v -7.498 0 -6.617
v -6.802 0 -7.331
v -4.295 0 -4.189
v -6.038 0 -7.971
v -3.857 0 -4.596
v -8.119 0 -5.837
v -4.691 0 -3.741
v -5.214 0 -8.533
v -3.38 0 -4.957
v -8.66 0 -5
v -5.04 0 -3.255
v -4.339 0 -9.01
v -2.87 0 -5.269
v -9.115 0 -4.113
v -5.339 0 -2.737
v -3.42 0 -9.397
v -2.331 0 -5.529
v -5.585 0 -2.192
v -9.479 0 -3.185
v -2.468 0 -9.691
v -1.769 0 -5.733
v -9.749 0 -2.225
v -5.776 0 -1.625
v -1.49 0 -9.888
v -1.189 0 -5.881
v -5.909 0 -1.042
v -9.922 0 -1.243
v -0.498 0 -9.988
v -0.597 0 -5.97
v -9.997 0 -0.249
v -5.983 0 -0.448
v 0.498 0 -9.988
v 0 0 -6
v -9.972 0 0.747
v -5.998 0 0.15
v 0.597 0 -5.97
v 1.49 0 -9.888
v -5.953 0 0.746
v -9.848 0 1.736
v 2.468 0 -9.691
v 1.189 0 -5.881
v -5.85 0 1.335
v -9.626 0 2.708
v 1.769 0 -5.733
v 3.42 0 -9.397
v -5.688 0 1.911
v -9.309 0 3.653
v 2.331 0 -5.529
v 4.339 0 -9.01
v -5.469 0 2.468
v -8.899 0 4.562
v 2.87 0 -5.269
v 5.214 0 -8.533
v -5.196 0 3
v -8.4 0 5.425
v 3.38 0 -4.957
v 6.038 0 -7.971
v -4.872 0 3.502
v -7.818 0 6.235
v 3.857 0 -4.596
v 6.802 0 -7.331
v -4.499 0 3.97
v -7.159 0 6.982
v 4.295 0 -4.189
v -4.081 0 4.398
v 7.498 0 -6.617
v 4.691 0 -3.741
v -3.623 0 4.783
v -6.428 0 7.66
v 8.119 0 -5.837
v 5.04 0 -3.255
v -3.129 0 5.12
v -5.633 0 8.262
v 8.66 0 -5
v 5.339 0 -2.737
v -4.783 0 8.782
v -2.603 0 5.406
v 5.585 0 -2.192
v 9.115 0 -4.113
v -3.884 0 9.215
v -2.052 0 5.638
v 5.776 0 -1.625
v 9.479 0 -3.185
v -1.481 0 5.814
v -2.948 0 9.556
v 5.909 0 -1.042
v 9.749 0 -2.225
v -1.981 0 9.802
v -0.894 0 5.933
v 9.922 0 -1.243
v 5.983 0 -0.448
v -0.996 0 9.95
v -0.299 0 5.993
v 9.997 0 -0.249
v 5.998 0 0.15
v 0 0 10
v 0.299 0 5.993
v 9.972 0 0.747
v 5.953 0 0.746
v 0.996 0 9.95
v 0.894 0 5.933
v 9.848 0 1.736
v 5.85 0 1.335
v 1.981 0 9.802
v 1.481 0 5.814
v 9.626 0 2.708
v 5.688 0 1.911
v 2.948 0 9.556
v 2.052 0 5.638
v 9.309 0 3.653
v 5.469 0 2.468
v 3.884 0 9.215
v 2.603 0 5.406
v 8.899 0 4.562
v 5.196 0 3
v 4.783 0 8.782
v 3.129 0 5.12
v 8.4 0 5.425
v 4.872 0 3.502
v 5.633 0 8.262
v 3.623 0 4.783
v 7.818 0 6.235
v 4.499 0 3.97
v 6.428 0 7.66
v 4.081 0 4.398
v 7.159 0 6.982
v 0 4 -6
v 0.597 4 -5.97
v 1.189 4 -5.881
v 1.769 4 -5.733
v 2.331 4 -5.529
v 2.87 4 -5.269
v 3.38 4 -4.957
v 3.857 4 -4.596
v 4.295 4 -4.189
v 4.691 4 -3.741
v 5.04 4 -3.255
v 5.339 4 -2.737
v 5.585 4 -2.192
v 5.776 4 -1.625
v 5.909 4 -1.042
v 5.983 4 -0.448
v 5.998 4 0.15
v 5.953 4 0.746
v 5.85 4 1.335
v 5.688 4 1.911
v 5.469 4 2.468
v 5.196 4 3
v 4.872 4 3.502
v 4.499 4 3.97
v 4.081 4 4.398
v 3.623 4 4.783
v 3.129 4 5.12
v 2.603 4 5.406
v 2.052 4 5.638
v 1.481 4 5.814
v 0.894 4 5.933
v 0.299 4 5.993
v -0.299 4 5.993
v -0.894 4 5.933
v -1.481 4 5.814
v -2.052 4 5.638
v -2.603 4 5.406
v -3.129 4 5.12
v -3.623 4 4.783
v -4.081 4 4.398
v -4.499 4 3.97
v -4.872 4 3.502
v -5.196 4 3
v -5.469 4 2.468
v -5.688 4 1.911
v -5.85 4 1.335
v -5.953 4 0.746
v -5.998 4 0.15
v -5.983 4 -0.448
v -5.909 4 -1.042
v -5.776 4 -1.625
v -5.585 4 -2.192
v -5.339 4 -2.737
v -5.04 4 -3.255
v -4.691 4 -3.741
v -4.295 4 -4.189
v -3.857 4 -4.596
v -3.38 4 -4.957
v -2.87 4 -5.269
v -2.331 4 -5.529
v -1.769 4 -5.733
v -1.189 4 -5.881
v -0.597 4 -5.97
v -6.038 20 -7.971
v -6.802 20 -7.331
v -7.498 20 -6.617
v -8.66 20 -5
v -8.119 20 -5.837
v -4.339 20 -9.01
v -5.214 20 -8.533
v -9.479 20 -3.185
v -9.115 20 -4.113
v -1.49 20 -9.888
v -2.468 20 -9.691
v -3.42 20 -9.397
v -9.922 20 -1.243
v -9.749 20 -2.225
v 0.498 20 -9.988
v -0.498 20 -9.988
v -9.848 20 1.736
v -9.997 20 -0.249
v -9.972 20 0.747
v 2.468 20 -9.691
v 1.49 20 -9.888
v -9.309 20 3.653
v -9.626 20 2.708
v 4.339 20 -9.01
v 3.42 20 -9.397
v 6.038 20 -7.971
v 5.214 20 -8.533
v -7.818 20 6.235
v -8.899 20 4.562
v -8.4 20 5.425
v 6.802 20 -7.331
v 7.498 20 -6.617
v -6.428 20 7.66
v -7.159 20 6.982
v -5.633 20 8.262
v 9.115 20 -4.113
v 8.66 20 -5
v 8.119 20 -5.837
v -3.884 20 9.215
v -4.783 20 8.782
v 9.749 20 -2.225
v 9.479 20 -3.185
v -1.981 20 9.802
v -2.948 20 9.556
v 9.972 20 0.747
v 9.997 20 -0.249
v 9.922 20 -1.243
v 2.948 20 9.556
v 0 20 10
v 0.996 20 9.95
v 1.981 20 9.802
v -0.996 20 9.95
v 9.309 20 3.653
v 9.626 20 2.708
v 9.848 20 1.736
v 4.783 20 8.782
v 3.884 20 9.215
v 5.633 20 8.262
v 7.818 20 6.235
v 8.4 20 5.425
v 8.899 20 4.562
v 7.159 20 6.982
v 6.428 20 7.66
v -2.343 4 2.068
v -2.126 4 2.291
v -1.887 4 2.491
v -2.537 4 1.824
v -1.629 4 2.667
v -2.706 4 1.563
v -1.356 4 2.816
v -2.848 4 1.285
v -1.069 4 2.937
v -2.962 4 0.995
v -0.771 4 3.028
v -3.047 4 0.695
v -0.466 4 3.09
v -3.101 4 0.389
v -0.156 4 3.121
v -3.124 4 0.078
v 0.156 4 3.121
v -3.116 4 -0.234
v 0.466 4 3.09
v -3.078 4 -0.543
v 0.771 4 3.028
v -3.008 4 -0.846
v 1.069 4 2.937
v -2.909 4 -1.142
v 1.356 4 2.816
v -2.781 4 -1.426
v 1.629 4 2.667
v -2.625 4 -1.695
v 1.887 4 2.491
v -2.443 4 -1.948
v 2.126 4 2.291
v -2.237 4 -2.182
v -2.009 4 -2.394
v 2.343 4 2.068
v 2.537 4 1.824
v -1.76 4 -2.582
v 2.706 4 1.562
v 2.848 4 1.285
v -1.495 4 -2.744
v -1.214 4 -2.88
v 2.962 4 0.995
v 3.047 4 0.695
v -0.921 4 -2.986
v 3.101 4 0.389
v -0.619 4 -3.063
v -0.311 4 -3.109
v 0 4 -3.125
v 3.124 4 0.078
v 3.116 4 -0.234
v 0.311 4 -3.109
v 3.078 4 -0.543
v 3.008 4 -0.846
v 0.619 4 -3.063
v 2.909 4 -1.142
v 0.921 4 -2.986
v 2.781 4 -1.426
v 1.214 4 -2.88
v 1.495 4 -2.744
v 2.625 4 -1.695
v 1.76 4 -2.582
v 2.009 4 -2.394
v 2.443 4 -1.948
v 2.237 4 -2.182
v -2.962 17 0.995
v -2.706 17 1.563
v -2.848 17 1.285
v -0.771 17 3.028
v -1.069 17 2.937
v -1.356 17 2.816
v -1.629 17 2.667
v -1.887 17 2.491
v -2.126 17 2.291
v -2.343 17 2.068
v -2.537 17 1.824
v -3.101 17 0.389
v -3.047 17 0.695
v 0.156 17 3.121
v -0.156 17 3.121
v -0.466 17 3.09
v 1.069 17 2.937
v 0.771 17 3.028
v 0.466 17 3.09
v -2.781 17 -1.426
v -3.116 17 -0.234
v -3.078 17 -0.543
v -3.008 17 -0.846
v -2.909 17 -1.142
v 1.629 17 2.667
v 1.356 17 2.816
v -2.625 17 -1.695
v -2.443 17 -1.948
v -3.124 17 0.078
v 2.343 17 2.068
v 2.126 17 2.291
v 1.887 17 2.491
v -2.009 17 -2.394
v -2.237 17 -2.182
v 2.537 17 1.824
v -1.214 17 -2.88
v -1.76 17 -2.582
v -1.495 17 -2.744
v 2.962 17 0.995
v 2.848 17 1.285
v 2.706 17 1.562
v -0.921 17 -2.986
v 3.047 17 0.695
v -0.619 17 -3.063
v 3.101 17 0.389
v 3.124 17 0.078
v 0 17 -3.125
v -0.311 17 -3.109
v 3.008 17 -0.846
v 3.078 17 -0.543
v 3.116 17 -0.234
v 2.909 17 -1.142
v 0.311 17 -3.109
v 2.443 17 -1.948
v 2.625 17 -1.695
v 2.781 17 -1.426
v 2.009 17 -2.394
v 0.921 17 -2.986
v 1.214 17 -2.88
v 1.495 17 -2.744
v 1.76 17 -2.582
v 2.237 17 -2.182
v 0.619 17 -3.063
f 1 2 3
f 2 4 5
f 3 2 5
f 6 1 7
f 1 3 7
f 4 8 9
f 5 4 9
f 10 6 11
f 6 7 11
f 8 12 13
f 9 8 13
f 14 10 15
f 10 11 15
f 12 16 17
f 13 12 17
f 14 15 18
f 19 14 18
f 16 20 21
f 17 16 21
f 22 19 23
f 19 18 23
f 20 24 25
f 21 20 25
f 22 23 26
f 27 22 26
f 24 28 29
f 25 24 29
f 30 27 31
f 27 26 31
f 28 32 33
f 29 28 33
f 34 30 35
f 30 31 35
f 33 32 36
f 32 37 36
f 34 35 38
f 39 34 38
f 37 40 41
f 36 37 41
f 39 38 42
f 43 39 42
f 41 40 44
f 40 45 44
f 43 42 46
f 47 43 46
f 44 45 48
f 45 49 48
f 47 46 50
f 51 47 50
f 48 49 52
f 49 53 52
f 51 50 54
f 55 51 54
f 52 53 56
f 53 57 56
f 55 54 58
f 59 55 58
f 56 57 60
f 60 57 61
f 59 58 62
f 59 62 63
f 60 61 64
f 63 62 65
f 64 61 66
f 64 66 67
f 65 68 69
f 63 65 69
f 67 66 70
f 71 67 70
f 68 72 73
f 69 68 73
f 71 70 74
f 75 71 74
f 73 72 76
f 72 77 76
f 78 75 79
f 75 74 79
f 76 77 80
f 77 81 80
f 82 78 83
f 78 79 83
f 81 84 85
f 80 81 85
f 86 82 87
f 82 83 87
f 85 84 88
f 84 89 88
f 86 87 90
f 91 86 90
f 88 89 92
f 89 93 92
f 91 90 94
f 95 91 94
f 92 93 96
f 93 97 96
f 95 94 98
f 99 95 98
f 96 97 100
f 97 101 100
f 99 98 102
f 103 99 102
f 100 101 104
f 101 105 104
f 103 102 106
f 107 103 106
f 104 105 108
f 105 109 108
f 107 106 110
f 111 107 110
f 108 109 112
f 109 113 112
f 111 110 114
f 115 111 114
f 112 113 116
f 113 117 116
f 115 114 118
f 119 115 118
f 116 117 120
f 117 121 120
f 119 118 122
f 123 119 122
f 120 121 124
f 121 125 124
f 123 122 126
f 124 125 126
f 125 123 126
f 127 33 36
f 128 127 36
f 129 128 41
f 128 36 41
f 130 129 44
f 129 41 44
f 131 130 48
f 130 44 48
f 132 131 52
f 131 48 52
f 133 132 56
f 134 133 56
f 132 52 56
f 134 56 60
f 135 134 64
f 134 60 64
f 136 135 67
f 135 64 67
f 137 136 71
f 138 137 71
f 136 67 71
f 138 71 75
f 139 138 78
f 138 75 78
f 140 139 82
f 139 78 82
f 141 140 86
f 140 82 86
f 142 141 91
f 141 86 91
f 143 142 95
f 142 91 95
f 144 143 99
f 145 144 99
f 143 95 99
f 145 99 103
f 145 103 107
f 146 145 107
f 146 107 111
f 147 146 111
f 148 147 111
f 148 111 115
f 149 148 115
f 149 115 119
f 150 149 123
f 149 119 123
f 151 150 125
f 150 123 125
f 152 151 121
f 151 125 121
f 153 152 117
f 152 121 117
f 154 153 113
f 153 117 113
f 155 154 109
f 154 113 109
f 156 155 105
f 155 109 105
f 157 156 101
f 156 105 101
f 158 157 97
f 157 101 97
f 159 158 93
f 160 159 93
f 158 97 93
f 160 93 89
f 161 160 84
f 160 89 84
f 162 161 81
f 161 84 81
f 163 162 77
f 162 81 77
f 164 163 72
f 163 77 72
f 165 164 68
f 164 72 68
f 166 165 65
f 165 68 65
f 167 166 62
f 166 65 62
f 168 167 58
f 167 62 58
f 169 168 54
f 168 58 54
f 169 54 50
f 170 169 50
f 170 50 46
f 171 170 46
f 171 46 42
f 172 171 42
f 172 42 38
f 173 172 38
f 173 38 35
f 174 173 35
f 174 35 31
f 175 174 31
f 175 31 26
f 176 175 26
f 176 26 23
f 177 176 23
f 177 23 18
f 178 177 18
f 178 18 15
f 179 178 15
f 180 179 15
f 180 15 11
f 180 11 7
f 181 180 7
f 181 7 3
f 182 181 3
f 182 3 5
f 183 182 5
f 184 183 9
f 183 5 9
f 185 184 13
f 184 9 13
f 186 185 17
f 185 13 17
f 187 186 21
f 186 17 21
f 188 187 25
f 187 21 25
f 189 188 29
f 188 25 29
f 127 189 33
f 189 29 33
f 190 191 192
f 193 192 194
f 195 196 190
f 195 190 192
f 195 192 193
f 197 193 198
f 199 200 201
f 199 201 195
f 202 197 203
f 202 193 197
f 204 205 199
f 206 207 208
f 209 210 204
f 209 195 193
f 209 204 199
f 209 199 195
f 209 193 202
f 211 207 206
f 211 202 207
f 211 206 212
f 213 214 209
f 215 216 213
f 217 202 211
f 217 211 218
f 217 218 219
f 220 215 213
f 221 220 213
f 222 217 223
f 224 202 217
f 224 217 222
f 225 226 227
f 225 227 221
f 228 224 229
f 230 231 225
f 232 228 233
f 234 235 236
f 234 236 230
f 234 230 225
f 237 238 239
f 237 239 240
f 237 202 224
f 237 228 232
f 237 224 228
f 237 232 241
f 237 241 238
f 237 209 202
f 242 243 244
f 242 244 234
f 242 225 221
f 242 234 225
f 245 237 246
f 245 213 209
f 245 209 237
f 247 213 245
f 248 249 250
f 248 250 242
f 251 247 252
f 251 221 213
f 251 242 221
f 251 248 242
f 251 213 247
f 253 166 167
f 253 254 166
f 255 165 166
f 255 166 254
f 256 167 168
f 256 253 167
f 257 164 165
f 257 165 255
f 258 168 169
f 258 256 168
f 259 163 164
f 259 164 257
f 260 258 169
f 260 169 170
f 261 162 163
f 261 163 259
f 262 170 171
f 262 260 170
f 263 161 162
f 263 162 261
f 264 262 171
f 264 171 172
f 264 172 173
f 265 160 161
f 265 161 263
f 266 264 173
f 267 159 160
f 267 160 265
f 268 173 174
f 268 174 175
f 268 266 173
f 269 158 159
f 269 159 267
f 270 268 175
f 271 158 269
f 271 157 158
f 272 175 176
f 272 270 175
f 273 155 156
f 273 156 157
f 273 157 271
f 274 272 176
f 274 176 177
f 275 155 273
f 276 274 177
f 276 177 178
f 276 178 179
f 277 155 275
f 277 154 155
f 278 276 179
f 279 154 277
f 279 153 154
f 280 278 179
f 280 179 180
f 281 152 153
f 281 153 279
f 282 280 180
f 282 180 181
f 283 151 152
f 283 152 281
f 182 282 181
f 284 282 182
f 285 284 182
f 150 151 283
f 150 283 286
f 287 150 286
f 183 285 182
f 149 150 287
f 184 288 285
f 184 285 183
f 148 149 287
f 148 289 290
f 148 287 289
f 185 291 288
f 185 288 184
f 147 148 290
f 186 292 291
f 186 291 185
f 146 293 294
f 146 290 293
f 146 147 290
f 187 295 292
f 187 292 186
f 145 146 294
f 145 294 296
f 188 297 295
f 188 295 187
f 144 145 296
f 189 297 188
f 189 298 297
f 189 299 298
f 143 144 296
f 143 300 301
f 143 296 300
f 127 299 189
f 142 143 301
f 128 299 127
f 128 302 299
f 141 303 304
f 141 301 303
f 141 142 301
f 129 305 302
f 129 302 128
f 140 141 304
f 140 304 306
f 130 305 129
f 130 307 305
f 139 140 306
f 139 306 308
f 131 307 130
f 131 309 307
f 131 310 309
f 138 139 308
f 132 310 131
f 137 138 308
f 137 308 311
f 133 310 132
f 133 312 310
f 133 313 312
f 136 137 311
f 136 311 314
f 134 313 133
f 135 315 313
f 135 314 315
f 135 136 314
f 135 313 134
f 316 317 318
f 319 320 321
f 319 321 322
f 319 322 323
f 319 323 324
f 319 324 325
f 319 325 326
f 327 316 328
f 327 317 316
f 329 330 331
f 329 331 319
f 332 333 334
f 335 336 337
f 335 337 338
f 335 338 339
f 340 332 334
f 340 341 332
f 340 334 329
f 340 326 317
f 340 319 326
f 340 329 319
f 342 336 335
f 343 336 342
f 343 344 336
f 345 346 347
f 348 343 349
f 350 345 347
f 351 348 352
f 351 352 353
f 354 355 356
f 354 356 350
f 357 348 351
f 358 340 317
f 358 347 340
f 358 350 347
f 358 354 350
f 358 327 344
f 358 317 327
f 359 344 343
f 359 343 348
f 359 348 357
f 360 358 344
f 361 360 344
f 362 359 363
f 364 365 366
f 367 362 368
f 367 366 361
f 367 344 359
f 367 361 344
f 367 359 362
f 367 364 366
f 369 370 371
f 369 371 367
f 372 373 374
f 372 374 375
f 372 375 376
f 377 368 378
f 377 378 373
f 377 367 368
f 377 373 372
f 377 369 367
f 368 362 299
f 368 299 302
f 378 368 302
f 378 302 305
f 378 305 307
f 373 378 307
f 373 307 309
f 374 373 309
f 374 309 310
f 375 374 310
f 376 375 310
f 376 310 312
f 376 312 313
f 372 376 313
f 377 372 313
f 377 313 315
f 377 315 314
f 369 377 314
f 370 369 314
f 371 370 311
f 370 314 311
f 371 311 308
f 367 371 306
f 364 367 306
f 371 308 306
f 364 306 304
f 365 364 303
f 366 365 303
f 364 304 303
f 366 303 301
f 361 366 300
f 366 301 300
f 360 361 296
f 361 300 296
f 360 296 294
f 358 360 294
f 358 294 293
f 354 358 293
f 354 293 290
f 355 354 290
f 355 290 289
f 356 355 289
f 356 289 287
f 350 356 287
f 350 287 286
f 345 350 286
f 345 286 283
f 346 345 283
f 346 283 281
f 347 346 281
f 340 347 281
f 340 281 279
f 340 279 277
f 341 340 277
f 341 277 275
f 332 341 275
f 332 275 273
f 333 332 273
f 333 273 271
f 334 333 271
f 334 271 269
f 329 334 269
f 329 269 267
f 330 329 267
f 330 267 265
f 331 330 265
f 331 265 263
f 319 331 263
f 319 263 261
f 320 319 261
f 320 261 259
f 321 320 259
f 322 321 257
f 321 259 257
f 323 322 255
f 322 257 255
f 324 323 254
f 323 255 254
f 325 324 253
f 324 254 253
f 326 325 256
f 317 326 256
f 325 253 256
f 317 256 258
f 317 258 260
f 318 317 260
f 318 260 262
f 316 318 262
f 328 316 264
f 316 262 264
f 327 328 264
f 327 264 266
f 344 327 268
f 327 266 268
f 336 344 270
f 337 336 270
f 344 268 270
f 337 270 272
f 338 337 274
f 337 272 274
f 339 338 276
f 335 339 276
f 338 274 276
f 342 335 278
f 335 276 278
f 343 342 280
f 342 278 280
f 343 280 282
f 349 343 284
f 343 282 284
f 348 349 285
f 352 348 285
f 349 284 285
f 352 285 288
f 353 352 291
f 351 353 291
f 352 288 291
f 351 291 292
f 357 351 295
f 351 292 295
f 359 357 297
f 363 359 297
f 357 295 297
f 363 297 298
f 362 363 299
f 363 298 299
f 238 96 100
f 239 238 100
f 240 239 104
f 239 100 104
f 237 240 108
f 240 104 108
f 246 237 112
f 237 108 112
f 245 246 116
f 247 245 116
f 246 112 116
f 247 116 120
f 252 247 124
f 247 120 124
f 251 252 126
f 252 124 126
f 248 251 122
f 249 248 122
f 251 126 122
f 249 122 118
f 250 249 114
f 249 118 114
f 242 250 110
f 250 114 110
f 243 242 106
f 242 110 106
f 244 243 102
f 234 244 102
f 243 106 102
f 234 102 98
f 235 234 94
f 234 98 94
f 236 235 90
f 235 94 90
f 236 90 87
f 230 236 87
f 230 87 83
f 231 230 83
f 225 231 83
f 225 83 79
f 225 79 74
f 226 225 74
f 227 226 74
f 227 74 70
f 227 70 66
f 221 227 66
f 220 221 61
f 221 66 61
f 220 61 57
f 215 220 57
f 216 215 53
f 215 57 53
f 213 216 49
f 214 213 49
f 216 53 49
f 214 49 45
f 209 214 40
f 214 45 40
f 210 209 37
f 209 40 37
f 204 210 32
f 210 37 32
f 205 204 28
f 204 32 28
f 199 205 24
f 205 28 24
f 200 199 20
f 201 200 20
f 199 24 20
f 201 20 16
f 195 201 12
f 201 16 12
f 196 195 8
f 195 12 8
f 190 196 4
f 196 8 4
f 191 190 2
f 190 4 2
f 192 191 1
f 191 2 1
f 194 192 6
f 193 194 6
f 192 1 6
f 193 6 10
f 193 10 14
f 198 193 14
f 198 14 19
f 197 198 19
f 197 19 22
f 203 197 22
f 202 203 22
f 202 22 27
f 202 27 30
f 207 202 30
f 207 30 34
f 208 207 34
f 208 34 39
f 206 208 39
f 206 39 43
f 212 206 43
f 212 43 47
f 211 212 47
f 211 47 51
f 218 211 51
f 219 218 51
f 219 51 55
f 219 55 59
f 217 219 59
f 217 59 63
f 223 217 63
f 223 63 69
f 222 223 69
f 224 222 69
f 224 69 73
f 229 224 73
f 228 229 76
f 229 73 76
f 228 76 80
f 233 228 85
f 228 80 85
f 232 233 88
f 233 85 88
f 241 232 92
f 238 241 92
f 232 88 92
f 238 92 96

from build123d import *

# Parameters (mm, degrees)
SKETCH1_R           = 10
BOSS_EXTRUDE1_DEPTH = 20
SKETCH2_R           = 3.125
CUT_EXTRUDE1_DEPTH  = 17
SKETCH3_R           = 6
CUT_EXTRUDE2_DEPTH  = 4


with BuildPart() as part:
    # Sketch1 → Boss-Extrude1 (new body)
    with BuildSketch(Plane(origin=(0, 0, 0), x_dir=(1, 0, 0), z_dir=(0, 1, 0))):
        with Locations(Location((0, 0, 0), (0, 0, 270))):  # turned: the seam where the file's is
            Circle(SKETCH1_R)
    extrude(amount=BOSS_EXTRUDE1_DEPTH)

    # Sketch2 → Cut-Extrude1 (cut)
    with BuildSketch(Plane.XZ):
        with Locations(Location((0, 0, 0), (0, 0, 270))):  # turned: the seam where the file's is
            Circle(SKETCH2_R)
    extrude(amount=-CUT_EXTRUDE1_DEPTH, mode=Mode.SUBTRACT)

    # Sketch3 → Cut-Extrude2 (cut)
    with BuildSketch(Plane.XZ):
        with Locations(Location((0, 0, 0), (0, 0, 270))):  # turned: the seam where the file's is
            Circle(SKETCH3_R)
    extrude(amount=-CUT_EXTRUDE2_DEPTH, mode=Mode.SUBTRACT)


solid = part.part
